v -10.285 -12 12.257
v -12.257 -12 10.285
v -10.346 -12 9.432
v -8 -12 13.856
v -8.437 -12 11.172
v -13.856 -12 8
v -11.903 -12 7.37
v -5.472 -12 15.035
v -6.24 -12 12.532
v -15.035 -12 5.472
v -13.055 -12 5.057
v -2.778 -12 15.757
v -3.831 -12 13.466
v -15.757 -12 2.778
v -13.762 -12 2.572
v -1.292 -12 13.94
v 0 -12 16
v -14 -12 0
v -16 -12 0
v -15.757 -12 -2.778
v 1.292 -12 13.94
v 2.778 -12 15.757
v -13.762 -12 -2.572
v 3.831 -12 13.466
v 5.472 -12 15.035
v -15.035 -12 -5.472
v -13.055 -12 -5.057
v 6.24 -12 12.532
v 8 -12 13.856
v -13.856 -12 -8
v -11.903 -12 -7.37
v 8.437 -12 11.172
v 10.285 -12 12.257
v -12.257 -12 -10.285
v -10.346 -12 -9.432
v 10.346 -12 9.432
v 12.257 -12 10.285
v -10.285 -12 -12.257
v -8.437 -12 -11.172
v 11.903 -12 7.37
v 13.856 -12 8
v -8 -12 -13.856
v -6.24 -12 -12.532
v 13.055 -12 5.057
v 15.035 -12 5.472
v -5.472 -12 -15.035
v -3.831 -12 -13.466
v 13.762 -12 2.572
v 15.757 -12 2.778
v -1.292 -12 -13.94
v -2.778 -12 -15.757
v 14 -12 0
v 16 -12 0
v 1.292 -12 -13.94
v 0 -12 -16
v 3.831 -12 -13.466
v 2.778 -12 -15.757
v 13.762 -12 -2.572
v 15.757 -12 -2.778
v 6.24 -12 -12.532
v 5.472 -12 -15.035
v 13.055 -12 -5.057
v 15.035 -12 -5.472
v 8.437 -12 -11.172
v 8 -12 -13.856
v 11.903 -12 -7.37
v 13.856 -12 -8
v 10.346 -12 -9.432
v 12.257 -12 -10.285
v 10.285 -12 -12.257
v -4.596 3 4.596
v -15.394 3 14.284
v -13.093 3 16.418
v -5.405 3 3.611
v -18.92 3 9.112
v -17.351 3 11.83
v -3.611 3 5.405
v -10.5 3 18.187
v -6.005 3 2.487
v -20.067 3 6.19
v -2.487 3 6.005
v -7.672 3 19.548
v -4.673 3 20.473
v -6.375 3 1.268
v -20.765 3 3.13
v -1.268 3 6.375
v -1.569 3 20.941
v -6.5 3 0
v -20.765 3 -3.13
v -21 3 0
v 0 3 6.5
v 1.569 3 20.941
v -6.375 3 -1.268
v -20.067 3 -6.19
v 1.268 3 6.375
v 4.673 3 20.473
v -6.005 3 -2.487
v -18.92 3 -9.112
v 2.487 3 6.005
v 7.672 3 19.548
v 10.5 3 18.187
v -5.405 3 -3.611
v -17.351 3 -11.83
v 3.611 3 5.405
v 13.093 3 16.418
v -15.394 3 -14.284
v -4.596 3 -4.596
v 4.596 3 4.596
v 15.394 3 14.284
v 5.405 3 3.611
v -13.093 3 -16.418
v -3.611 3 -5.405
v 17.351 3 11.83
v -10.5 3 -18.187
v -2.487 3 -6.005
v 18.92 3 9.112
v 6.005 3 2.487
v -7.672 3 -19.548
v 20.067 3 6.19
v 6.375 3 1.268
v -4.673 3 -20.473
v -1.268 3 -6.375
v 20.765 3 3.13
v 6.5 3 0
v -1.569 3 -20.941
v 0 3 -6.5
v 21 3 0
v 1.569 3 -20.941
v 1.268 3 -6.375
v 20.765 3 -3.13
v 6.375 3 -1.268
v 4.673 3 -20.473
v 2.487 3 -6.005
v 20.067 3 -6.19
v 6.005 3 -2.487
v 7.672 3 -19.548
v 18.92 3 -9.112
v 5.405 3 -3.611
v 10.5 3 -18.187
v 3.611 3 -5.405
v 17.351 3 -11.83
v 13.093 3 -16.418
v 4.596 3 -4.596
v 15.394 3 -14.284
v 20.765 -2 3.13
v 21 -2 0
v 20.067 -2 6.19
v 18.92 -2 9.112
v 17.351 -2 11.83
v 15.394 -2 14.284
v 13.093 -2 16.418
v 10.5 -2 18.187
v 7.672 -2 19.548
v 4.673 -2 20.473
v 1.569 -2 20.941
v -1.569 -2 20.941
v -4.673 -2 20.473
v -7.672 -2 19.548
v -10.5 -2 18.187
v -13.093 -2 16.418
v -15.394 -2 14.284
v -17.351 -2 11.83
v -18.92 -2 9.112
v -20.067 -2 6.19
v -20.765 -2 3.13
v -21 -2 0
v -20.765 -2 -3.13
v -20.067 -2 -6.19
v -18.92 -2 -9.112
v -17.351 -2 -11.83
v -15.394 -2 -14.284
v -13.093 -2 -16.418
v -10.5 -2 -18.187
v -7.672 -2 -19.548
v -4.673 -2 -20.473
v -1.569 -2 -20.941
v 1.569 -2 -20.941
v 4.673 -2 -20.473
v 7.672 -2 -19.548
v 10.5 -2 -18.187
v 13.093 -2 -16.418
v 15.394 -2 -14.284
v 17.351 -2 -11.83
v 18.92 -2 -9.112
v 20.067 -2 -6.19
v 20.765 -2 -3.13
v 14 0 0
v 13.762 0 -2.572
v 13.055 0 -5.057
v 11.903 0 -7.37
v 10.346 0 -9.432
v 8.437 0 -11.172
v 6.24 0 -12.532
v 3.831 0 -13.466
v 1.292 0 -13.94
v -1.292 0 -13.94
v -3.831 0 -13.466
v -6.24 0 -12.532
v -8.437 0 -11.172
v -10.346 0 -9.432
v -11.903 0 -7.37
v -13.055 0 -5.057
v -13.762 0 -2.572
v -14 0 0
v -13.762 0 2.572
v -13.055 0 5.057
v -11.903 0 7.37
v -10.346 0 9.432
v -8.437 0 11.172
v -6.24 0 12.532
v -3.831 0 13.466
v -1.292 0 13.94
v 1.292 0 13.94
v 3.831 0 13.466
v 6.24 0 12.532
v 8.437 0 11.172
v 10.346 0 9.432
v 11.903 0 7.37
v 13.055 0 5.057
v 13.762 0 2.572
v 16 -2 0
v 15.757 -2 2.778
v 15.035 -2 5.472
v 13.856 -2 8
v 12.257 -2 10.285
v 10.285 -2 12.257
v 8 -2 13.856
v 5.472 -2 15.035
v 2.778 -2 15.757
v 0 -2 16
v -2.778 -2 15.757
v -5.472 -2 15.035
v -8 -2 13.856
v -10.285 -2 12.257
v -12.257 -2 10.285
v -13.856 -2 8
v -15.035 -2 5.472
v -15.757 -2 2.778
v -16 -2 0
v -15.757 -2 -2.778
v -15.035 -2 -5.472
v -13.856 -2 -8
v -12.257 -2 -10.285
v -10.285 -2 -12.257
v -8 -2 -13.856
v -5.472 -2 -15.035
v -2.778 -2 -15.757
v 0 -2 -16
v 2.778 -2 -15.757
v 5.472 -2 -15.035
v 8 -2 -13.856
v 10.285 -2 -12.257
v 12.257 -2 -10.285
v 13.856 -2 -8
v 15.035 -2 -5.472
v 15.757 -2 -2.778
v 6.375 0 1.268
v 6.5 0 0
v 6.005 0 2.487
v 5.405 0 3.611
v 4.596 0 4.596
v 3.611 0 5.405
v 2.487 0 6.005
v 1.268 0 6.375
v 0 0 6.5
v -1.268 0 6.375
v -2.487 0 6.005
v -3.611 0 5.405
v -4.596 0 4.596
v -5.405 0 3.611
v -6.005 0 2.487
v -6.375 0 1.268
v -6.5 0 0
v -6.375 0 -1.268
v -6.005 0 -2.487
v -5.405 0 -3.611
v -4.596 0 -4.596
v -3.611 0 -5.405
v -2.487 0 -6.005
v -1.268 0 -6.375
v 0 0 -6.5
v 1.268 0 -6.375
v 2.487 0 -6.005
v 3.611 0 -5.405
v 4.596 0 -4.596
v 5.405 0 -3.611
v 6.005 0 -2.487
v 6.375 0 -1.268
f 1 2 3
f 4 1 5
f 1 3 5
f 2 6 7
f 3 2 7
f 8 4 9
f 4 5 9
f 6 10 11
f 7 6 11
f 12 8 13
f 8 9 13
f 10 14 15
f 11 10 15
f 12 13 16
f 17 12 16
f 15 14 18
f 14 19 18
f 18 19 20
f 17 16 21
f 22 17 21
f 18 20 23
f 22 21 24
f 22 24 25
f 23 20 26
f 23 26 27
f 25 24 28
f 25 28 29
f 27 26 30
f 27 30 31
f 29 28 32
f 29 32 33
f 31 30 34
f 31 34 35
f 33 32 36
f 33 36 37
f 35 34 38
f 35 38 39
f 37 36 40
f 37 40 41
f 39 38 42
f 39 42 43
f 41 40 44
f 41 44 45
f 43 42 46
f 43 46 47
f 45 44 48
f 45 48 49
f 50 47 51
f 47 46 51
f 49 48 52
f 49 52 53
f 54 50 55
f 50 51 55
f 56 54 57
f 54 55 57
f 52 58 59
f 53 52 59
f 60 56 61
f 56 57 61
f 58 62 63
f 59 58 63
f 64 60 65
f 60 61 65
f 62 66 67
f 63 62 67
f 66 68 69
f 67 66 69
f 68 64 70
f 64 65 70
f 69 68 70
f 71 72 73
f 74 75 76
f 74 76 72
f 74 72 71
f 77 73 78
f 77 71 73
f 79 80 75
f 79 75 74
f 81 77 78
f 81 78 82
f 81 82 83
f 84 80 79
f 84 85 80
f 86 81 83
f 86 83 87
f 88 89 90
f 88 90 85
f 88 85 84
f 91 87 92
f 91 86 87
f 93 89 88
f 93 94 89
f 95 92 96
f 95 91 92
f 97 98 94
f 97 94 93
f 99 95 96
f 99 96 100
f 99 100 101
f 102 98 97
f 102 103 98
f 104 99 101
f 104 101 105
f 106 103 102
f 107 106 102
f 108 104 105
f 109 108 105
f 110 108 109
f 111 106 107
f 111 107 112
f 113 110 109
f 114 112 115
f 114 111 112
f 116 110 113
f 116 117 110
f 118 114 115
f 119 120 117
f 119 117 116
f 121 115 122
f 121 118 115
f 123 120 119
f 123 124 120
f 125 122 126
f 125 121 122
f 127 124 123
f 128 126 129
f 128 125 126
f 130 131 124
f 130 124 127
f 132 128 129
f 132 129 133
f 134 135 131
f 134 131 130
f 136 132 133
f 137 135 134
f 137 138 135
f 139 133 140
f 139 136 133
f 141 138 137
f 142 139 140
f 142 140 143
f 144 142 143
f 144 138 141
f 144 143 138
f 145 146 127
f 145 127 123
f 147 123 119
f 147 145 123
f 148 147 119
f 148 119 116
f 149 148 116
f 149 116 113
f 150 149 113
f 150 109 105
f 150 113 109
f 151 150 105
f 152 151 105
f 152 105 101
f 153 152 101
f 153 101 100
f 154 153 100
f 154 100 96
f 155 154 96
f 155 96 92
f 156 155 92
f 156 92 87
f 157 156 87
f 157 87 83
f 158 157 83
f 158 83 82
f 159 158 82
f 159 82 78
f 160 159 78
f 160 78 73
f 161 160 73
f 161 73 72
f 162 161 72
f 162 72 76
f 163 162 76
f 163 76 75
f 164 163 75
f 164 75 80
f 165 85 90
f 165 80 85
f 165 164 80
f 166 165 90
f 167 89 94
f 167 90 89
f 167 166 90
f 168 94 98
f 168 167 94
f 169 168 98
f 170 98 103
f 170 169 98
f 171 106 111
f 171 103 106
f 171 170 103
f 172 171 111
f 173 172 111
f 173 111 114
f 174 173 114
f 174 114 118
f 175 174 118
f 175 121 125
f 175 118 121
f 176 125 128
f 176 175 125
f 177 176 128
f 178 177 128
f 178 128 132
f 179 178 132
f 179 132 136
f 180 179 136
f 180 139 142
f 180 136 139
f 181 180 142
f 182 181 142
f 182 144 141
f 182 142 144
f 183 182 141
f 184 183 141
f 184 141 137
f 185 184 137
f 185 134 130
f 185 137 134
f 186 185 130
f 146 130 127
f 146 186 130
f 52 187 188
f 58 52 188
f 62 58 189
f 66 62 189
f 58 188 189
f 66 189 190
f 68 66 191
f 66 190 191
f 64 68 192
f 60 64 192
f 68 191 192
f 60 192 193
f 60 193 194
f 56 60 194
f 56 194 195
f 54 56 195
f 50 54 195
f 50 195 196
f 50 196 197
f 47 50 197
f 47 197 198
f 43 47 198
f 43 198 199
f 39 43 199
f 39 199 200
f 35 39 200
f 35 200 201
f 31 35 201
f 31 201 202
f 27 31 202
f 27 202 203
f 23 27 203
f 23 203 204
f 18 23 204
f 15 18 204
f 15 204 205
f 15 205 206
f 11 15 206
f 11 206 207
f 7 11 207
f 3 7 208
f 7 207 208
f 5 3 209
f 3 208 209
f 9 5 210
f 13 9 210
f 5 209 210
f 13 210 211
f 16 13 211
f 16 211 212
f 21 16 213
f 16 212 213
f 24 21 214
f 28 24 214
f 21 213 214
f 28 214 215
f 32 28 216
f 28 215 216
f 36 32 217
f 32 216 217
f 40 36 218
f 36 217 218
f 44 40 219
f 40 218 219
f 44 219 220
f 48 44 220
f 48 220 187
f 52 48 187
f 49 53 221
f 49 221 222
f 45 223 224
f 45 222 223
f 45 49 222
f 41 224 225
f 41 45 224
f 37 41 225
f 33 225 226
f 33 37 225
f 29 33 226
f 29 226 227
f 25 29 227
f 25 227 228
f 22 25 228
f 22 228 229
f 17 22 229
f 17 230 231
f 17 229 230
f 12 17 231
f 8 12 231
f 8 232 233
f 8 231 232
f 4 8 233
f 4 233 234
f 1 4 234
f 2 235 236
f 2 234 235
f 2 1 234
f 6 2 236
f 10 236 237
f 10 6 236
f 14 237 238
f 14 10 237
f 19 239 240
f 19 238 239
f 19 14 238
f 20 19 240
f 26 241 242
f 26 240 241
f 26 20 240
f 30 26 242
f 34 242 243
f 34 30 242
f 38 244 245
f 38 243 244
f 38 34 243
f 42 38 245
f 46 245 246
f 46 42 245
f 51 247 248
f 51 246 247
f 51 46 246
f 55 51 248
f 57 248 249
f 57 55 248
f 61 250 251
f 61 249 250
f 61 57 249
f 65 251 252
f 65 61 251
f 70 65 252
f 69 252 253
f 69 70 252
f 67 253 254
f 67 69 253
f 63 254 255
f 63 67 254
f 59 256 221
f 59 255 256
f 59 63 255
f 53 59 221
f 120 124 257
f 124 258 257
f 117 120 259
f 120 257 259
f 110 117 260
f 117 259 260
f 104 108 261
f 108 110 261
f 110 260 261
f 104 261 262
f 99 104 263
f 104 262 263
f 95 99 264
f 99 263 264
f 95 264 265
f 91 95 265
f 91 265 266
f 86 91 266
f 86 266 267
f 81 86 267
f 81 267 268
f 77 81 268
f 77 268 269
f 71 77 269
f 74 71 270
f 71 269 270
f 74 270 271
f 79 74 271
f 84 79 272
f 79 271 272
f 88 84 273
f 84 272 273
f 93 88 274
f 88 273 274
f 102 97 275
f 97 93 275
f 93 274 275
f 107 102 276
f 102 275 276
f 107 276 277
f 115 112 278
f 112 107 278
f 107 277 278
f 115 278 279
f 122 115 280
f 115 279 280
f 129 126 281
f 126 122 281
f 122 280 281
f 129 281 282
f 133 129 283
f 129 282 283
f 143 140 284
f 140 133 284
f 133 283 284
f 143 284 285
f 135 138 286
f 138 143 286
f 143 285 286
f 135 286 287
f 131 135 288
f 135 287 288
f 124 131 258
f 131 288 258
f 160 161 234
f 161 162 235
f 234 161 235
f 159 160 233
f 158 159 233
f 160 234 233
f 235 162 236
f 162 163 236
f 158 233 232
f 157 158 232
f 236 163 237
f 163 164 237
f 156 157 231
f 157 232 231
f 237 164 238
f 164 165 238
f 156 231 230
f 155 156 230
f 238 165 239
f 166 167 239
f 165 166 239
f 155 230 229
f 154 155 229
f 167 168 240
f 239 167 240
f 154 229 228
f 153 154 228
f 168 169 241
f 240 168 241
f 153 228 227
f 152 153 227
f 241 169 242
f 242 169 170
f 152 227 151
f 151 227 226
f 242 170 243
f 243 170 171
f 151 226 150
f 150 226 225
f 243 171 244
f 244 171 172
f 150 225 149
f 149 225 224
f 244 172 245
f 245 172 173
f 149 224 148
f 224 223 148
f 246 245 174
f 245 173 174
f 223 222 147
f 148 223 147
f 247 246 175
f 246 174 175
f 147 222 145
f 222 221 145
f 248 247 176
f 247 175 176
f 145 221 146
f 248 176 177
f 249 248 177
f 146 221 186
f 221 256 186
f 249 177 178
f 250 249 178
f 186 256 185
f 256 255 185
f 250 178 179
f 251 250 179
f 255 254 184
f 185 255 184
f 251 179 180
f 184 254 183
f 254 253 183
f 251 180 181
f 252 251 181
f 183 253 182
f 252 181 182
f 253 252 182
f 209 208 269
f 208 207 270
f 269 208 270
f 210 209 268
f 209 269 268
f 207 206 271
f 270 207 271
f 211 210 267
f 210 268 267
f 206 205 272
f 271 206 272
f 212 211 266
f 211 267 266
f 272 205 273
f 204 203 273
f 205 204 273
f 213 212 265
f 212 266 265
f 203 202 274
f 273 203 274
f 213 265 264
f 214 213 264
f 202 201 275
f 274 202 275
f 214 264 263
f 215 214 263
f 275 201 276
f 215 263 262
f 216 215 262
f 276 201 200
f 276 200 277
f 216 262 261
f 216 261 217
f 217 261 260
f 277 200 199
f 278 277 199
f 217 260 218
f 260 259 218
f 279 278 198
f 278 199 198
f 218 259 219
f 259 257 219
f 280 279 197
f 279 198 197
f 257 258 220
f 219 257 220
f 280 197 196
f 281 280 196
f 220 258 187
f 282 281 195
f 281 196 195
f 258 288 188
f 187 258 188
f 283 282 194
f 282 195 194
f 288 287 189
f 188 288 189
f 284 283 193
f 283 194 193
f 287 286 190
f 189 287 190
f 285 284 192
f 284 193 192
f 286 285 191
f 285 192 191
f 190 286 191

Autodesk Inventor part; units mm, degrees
ref_plane "YZ Plane" through (0, 0, 0) normal (1, 0, 0) x (0, 1, 0)
ref_plane "XZ Plane" through (0, 0, 0) normal (0, 1, 0) x (-1, 0, 0)
ref_plane "XY Plane" through (0, 0, 0) normal (0, 0, 1) x (1, 0, 0)
sketch "Sketch1" plane through (0, 0, 0) normal (0, 0, 1) x (1, 0, 0)
  line L0 (0, 0) -> (0, 13.3519) construction
  line L1 (14, -12) -> (14, 0)
  line L2 (14, 0) -> (6.5, 0)
  line L3 (6.5, 3) -> (21, 3)
  line L4 (21, 3) -> (21, -2)
  line L5 (21, -2) -> (16, -2)
  line L6 (16, -2) -> (16, -12)
  line L7 (16, -12) -> (14, -12)
  line L8 (6.5, 3) -> (6.5, 0)
  line L9 (0, 0) -> (6.5, 0) construction
  dimension "d0" = 28
  dimension "d1" = 12
  dimension "d2" = 10
  dimension "d3" = 32
  dimension "d4" = 5
  dimension "d5" = 42
  dimension "d9" = 13
revolve "Revolution1" add sketch "Sketch1" angle 360 about axis through (0, 0, 0) along (0, 1, 0)
thread "Thread1" size "M32x2" class "6g" standard "ANSI Metric M Profile" full length
properties part number "LagerDeckel"
